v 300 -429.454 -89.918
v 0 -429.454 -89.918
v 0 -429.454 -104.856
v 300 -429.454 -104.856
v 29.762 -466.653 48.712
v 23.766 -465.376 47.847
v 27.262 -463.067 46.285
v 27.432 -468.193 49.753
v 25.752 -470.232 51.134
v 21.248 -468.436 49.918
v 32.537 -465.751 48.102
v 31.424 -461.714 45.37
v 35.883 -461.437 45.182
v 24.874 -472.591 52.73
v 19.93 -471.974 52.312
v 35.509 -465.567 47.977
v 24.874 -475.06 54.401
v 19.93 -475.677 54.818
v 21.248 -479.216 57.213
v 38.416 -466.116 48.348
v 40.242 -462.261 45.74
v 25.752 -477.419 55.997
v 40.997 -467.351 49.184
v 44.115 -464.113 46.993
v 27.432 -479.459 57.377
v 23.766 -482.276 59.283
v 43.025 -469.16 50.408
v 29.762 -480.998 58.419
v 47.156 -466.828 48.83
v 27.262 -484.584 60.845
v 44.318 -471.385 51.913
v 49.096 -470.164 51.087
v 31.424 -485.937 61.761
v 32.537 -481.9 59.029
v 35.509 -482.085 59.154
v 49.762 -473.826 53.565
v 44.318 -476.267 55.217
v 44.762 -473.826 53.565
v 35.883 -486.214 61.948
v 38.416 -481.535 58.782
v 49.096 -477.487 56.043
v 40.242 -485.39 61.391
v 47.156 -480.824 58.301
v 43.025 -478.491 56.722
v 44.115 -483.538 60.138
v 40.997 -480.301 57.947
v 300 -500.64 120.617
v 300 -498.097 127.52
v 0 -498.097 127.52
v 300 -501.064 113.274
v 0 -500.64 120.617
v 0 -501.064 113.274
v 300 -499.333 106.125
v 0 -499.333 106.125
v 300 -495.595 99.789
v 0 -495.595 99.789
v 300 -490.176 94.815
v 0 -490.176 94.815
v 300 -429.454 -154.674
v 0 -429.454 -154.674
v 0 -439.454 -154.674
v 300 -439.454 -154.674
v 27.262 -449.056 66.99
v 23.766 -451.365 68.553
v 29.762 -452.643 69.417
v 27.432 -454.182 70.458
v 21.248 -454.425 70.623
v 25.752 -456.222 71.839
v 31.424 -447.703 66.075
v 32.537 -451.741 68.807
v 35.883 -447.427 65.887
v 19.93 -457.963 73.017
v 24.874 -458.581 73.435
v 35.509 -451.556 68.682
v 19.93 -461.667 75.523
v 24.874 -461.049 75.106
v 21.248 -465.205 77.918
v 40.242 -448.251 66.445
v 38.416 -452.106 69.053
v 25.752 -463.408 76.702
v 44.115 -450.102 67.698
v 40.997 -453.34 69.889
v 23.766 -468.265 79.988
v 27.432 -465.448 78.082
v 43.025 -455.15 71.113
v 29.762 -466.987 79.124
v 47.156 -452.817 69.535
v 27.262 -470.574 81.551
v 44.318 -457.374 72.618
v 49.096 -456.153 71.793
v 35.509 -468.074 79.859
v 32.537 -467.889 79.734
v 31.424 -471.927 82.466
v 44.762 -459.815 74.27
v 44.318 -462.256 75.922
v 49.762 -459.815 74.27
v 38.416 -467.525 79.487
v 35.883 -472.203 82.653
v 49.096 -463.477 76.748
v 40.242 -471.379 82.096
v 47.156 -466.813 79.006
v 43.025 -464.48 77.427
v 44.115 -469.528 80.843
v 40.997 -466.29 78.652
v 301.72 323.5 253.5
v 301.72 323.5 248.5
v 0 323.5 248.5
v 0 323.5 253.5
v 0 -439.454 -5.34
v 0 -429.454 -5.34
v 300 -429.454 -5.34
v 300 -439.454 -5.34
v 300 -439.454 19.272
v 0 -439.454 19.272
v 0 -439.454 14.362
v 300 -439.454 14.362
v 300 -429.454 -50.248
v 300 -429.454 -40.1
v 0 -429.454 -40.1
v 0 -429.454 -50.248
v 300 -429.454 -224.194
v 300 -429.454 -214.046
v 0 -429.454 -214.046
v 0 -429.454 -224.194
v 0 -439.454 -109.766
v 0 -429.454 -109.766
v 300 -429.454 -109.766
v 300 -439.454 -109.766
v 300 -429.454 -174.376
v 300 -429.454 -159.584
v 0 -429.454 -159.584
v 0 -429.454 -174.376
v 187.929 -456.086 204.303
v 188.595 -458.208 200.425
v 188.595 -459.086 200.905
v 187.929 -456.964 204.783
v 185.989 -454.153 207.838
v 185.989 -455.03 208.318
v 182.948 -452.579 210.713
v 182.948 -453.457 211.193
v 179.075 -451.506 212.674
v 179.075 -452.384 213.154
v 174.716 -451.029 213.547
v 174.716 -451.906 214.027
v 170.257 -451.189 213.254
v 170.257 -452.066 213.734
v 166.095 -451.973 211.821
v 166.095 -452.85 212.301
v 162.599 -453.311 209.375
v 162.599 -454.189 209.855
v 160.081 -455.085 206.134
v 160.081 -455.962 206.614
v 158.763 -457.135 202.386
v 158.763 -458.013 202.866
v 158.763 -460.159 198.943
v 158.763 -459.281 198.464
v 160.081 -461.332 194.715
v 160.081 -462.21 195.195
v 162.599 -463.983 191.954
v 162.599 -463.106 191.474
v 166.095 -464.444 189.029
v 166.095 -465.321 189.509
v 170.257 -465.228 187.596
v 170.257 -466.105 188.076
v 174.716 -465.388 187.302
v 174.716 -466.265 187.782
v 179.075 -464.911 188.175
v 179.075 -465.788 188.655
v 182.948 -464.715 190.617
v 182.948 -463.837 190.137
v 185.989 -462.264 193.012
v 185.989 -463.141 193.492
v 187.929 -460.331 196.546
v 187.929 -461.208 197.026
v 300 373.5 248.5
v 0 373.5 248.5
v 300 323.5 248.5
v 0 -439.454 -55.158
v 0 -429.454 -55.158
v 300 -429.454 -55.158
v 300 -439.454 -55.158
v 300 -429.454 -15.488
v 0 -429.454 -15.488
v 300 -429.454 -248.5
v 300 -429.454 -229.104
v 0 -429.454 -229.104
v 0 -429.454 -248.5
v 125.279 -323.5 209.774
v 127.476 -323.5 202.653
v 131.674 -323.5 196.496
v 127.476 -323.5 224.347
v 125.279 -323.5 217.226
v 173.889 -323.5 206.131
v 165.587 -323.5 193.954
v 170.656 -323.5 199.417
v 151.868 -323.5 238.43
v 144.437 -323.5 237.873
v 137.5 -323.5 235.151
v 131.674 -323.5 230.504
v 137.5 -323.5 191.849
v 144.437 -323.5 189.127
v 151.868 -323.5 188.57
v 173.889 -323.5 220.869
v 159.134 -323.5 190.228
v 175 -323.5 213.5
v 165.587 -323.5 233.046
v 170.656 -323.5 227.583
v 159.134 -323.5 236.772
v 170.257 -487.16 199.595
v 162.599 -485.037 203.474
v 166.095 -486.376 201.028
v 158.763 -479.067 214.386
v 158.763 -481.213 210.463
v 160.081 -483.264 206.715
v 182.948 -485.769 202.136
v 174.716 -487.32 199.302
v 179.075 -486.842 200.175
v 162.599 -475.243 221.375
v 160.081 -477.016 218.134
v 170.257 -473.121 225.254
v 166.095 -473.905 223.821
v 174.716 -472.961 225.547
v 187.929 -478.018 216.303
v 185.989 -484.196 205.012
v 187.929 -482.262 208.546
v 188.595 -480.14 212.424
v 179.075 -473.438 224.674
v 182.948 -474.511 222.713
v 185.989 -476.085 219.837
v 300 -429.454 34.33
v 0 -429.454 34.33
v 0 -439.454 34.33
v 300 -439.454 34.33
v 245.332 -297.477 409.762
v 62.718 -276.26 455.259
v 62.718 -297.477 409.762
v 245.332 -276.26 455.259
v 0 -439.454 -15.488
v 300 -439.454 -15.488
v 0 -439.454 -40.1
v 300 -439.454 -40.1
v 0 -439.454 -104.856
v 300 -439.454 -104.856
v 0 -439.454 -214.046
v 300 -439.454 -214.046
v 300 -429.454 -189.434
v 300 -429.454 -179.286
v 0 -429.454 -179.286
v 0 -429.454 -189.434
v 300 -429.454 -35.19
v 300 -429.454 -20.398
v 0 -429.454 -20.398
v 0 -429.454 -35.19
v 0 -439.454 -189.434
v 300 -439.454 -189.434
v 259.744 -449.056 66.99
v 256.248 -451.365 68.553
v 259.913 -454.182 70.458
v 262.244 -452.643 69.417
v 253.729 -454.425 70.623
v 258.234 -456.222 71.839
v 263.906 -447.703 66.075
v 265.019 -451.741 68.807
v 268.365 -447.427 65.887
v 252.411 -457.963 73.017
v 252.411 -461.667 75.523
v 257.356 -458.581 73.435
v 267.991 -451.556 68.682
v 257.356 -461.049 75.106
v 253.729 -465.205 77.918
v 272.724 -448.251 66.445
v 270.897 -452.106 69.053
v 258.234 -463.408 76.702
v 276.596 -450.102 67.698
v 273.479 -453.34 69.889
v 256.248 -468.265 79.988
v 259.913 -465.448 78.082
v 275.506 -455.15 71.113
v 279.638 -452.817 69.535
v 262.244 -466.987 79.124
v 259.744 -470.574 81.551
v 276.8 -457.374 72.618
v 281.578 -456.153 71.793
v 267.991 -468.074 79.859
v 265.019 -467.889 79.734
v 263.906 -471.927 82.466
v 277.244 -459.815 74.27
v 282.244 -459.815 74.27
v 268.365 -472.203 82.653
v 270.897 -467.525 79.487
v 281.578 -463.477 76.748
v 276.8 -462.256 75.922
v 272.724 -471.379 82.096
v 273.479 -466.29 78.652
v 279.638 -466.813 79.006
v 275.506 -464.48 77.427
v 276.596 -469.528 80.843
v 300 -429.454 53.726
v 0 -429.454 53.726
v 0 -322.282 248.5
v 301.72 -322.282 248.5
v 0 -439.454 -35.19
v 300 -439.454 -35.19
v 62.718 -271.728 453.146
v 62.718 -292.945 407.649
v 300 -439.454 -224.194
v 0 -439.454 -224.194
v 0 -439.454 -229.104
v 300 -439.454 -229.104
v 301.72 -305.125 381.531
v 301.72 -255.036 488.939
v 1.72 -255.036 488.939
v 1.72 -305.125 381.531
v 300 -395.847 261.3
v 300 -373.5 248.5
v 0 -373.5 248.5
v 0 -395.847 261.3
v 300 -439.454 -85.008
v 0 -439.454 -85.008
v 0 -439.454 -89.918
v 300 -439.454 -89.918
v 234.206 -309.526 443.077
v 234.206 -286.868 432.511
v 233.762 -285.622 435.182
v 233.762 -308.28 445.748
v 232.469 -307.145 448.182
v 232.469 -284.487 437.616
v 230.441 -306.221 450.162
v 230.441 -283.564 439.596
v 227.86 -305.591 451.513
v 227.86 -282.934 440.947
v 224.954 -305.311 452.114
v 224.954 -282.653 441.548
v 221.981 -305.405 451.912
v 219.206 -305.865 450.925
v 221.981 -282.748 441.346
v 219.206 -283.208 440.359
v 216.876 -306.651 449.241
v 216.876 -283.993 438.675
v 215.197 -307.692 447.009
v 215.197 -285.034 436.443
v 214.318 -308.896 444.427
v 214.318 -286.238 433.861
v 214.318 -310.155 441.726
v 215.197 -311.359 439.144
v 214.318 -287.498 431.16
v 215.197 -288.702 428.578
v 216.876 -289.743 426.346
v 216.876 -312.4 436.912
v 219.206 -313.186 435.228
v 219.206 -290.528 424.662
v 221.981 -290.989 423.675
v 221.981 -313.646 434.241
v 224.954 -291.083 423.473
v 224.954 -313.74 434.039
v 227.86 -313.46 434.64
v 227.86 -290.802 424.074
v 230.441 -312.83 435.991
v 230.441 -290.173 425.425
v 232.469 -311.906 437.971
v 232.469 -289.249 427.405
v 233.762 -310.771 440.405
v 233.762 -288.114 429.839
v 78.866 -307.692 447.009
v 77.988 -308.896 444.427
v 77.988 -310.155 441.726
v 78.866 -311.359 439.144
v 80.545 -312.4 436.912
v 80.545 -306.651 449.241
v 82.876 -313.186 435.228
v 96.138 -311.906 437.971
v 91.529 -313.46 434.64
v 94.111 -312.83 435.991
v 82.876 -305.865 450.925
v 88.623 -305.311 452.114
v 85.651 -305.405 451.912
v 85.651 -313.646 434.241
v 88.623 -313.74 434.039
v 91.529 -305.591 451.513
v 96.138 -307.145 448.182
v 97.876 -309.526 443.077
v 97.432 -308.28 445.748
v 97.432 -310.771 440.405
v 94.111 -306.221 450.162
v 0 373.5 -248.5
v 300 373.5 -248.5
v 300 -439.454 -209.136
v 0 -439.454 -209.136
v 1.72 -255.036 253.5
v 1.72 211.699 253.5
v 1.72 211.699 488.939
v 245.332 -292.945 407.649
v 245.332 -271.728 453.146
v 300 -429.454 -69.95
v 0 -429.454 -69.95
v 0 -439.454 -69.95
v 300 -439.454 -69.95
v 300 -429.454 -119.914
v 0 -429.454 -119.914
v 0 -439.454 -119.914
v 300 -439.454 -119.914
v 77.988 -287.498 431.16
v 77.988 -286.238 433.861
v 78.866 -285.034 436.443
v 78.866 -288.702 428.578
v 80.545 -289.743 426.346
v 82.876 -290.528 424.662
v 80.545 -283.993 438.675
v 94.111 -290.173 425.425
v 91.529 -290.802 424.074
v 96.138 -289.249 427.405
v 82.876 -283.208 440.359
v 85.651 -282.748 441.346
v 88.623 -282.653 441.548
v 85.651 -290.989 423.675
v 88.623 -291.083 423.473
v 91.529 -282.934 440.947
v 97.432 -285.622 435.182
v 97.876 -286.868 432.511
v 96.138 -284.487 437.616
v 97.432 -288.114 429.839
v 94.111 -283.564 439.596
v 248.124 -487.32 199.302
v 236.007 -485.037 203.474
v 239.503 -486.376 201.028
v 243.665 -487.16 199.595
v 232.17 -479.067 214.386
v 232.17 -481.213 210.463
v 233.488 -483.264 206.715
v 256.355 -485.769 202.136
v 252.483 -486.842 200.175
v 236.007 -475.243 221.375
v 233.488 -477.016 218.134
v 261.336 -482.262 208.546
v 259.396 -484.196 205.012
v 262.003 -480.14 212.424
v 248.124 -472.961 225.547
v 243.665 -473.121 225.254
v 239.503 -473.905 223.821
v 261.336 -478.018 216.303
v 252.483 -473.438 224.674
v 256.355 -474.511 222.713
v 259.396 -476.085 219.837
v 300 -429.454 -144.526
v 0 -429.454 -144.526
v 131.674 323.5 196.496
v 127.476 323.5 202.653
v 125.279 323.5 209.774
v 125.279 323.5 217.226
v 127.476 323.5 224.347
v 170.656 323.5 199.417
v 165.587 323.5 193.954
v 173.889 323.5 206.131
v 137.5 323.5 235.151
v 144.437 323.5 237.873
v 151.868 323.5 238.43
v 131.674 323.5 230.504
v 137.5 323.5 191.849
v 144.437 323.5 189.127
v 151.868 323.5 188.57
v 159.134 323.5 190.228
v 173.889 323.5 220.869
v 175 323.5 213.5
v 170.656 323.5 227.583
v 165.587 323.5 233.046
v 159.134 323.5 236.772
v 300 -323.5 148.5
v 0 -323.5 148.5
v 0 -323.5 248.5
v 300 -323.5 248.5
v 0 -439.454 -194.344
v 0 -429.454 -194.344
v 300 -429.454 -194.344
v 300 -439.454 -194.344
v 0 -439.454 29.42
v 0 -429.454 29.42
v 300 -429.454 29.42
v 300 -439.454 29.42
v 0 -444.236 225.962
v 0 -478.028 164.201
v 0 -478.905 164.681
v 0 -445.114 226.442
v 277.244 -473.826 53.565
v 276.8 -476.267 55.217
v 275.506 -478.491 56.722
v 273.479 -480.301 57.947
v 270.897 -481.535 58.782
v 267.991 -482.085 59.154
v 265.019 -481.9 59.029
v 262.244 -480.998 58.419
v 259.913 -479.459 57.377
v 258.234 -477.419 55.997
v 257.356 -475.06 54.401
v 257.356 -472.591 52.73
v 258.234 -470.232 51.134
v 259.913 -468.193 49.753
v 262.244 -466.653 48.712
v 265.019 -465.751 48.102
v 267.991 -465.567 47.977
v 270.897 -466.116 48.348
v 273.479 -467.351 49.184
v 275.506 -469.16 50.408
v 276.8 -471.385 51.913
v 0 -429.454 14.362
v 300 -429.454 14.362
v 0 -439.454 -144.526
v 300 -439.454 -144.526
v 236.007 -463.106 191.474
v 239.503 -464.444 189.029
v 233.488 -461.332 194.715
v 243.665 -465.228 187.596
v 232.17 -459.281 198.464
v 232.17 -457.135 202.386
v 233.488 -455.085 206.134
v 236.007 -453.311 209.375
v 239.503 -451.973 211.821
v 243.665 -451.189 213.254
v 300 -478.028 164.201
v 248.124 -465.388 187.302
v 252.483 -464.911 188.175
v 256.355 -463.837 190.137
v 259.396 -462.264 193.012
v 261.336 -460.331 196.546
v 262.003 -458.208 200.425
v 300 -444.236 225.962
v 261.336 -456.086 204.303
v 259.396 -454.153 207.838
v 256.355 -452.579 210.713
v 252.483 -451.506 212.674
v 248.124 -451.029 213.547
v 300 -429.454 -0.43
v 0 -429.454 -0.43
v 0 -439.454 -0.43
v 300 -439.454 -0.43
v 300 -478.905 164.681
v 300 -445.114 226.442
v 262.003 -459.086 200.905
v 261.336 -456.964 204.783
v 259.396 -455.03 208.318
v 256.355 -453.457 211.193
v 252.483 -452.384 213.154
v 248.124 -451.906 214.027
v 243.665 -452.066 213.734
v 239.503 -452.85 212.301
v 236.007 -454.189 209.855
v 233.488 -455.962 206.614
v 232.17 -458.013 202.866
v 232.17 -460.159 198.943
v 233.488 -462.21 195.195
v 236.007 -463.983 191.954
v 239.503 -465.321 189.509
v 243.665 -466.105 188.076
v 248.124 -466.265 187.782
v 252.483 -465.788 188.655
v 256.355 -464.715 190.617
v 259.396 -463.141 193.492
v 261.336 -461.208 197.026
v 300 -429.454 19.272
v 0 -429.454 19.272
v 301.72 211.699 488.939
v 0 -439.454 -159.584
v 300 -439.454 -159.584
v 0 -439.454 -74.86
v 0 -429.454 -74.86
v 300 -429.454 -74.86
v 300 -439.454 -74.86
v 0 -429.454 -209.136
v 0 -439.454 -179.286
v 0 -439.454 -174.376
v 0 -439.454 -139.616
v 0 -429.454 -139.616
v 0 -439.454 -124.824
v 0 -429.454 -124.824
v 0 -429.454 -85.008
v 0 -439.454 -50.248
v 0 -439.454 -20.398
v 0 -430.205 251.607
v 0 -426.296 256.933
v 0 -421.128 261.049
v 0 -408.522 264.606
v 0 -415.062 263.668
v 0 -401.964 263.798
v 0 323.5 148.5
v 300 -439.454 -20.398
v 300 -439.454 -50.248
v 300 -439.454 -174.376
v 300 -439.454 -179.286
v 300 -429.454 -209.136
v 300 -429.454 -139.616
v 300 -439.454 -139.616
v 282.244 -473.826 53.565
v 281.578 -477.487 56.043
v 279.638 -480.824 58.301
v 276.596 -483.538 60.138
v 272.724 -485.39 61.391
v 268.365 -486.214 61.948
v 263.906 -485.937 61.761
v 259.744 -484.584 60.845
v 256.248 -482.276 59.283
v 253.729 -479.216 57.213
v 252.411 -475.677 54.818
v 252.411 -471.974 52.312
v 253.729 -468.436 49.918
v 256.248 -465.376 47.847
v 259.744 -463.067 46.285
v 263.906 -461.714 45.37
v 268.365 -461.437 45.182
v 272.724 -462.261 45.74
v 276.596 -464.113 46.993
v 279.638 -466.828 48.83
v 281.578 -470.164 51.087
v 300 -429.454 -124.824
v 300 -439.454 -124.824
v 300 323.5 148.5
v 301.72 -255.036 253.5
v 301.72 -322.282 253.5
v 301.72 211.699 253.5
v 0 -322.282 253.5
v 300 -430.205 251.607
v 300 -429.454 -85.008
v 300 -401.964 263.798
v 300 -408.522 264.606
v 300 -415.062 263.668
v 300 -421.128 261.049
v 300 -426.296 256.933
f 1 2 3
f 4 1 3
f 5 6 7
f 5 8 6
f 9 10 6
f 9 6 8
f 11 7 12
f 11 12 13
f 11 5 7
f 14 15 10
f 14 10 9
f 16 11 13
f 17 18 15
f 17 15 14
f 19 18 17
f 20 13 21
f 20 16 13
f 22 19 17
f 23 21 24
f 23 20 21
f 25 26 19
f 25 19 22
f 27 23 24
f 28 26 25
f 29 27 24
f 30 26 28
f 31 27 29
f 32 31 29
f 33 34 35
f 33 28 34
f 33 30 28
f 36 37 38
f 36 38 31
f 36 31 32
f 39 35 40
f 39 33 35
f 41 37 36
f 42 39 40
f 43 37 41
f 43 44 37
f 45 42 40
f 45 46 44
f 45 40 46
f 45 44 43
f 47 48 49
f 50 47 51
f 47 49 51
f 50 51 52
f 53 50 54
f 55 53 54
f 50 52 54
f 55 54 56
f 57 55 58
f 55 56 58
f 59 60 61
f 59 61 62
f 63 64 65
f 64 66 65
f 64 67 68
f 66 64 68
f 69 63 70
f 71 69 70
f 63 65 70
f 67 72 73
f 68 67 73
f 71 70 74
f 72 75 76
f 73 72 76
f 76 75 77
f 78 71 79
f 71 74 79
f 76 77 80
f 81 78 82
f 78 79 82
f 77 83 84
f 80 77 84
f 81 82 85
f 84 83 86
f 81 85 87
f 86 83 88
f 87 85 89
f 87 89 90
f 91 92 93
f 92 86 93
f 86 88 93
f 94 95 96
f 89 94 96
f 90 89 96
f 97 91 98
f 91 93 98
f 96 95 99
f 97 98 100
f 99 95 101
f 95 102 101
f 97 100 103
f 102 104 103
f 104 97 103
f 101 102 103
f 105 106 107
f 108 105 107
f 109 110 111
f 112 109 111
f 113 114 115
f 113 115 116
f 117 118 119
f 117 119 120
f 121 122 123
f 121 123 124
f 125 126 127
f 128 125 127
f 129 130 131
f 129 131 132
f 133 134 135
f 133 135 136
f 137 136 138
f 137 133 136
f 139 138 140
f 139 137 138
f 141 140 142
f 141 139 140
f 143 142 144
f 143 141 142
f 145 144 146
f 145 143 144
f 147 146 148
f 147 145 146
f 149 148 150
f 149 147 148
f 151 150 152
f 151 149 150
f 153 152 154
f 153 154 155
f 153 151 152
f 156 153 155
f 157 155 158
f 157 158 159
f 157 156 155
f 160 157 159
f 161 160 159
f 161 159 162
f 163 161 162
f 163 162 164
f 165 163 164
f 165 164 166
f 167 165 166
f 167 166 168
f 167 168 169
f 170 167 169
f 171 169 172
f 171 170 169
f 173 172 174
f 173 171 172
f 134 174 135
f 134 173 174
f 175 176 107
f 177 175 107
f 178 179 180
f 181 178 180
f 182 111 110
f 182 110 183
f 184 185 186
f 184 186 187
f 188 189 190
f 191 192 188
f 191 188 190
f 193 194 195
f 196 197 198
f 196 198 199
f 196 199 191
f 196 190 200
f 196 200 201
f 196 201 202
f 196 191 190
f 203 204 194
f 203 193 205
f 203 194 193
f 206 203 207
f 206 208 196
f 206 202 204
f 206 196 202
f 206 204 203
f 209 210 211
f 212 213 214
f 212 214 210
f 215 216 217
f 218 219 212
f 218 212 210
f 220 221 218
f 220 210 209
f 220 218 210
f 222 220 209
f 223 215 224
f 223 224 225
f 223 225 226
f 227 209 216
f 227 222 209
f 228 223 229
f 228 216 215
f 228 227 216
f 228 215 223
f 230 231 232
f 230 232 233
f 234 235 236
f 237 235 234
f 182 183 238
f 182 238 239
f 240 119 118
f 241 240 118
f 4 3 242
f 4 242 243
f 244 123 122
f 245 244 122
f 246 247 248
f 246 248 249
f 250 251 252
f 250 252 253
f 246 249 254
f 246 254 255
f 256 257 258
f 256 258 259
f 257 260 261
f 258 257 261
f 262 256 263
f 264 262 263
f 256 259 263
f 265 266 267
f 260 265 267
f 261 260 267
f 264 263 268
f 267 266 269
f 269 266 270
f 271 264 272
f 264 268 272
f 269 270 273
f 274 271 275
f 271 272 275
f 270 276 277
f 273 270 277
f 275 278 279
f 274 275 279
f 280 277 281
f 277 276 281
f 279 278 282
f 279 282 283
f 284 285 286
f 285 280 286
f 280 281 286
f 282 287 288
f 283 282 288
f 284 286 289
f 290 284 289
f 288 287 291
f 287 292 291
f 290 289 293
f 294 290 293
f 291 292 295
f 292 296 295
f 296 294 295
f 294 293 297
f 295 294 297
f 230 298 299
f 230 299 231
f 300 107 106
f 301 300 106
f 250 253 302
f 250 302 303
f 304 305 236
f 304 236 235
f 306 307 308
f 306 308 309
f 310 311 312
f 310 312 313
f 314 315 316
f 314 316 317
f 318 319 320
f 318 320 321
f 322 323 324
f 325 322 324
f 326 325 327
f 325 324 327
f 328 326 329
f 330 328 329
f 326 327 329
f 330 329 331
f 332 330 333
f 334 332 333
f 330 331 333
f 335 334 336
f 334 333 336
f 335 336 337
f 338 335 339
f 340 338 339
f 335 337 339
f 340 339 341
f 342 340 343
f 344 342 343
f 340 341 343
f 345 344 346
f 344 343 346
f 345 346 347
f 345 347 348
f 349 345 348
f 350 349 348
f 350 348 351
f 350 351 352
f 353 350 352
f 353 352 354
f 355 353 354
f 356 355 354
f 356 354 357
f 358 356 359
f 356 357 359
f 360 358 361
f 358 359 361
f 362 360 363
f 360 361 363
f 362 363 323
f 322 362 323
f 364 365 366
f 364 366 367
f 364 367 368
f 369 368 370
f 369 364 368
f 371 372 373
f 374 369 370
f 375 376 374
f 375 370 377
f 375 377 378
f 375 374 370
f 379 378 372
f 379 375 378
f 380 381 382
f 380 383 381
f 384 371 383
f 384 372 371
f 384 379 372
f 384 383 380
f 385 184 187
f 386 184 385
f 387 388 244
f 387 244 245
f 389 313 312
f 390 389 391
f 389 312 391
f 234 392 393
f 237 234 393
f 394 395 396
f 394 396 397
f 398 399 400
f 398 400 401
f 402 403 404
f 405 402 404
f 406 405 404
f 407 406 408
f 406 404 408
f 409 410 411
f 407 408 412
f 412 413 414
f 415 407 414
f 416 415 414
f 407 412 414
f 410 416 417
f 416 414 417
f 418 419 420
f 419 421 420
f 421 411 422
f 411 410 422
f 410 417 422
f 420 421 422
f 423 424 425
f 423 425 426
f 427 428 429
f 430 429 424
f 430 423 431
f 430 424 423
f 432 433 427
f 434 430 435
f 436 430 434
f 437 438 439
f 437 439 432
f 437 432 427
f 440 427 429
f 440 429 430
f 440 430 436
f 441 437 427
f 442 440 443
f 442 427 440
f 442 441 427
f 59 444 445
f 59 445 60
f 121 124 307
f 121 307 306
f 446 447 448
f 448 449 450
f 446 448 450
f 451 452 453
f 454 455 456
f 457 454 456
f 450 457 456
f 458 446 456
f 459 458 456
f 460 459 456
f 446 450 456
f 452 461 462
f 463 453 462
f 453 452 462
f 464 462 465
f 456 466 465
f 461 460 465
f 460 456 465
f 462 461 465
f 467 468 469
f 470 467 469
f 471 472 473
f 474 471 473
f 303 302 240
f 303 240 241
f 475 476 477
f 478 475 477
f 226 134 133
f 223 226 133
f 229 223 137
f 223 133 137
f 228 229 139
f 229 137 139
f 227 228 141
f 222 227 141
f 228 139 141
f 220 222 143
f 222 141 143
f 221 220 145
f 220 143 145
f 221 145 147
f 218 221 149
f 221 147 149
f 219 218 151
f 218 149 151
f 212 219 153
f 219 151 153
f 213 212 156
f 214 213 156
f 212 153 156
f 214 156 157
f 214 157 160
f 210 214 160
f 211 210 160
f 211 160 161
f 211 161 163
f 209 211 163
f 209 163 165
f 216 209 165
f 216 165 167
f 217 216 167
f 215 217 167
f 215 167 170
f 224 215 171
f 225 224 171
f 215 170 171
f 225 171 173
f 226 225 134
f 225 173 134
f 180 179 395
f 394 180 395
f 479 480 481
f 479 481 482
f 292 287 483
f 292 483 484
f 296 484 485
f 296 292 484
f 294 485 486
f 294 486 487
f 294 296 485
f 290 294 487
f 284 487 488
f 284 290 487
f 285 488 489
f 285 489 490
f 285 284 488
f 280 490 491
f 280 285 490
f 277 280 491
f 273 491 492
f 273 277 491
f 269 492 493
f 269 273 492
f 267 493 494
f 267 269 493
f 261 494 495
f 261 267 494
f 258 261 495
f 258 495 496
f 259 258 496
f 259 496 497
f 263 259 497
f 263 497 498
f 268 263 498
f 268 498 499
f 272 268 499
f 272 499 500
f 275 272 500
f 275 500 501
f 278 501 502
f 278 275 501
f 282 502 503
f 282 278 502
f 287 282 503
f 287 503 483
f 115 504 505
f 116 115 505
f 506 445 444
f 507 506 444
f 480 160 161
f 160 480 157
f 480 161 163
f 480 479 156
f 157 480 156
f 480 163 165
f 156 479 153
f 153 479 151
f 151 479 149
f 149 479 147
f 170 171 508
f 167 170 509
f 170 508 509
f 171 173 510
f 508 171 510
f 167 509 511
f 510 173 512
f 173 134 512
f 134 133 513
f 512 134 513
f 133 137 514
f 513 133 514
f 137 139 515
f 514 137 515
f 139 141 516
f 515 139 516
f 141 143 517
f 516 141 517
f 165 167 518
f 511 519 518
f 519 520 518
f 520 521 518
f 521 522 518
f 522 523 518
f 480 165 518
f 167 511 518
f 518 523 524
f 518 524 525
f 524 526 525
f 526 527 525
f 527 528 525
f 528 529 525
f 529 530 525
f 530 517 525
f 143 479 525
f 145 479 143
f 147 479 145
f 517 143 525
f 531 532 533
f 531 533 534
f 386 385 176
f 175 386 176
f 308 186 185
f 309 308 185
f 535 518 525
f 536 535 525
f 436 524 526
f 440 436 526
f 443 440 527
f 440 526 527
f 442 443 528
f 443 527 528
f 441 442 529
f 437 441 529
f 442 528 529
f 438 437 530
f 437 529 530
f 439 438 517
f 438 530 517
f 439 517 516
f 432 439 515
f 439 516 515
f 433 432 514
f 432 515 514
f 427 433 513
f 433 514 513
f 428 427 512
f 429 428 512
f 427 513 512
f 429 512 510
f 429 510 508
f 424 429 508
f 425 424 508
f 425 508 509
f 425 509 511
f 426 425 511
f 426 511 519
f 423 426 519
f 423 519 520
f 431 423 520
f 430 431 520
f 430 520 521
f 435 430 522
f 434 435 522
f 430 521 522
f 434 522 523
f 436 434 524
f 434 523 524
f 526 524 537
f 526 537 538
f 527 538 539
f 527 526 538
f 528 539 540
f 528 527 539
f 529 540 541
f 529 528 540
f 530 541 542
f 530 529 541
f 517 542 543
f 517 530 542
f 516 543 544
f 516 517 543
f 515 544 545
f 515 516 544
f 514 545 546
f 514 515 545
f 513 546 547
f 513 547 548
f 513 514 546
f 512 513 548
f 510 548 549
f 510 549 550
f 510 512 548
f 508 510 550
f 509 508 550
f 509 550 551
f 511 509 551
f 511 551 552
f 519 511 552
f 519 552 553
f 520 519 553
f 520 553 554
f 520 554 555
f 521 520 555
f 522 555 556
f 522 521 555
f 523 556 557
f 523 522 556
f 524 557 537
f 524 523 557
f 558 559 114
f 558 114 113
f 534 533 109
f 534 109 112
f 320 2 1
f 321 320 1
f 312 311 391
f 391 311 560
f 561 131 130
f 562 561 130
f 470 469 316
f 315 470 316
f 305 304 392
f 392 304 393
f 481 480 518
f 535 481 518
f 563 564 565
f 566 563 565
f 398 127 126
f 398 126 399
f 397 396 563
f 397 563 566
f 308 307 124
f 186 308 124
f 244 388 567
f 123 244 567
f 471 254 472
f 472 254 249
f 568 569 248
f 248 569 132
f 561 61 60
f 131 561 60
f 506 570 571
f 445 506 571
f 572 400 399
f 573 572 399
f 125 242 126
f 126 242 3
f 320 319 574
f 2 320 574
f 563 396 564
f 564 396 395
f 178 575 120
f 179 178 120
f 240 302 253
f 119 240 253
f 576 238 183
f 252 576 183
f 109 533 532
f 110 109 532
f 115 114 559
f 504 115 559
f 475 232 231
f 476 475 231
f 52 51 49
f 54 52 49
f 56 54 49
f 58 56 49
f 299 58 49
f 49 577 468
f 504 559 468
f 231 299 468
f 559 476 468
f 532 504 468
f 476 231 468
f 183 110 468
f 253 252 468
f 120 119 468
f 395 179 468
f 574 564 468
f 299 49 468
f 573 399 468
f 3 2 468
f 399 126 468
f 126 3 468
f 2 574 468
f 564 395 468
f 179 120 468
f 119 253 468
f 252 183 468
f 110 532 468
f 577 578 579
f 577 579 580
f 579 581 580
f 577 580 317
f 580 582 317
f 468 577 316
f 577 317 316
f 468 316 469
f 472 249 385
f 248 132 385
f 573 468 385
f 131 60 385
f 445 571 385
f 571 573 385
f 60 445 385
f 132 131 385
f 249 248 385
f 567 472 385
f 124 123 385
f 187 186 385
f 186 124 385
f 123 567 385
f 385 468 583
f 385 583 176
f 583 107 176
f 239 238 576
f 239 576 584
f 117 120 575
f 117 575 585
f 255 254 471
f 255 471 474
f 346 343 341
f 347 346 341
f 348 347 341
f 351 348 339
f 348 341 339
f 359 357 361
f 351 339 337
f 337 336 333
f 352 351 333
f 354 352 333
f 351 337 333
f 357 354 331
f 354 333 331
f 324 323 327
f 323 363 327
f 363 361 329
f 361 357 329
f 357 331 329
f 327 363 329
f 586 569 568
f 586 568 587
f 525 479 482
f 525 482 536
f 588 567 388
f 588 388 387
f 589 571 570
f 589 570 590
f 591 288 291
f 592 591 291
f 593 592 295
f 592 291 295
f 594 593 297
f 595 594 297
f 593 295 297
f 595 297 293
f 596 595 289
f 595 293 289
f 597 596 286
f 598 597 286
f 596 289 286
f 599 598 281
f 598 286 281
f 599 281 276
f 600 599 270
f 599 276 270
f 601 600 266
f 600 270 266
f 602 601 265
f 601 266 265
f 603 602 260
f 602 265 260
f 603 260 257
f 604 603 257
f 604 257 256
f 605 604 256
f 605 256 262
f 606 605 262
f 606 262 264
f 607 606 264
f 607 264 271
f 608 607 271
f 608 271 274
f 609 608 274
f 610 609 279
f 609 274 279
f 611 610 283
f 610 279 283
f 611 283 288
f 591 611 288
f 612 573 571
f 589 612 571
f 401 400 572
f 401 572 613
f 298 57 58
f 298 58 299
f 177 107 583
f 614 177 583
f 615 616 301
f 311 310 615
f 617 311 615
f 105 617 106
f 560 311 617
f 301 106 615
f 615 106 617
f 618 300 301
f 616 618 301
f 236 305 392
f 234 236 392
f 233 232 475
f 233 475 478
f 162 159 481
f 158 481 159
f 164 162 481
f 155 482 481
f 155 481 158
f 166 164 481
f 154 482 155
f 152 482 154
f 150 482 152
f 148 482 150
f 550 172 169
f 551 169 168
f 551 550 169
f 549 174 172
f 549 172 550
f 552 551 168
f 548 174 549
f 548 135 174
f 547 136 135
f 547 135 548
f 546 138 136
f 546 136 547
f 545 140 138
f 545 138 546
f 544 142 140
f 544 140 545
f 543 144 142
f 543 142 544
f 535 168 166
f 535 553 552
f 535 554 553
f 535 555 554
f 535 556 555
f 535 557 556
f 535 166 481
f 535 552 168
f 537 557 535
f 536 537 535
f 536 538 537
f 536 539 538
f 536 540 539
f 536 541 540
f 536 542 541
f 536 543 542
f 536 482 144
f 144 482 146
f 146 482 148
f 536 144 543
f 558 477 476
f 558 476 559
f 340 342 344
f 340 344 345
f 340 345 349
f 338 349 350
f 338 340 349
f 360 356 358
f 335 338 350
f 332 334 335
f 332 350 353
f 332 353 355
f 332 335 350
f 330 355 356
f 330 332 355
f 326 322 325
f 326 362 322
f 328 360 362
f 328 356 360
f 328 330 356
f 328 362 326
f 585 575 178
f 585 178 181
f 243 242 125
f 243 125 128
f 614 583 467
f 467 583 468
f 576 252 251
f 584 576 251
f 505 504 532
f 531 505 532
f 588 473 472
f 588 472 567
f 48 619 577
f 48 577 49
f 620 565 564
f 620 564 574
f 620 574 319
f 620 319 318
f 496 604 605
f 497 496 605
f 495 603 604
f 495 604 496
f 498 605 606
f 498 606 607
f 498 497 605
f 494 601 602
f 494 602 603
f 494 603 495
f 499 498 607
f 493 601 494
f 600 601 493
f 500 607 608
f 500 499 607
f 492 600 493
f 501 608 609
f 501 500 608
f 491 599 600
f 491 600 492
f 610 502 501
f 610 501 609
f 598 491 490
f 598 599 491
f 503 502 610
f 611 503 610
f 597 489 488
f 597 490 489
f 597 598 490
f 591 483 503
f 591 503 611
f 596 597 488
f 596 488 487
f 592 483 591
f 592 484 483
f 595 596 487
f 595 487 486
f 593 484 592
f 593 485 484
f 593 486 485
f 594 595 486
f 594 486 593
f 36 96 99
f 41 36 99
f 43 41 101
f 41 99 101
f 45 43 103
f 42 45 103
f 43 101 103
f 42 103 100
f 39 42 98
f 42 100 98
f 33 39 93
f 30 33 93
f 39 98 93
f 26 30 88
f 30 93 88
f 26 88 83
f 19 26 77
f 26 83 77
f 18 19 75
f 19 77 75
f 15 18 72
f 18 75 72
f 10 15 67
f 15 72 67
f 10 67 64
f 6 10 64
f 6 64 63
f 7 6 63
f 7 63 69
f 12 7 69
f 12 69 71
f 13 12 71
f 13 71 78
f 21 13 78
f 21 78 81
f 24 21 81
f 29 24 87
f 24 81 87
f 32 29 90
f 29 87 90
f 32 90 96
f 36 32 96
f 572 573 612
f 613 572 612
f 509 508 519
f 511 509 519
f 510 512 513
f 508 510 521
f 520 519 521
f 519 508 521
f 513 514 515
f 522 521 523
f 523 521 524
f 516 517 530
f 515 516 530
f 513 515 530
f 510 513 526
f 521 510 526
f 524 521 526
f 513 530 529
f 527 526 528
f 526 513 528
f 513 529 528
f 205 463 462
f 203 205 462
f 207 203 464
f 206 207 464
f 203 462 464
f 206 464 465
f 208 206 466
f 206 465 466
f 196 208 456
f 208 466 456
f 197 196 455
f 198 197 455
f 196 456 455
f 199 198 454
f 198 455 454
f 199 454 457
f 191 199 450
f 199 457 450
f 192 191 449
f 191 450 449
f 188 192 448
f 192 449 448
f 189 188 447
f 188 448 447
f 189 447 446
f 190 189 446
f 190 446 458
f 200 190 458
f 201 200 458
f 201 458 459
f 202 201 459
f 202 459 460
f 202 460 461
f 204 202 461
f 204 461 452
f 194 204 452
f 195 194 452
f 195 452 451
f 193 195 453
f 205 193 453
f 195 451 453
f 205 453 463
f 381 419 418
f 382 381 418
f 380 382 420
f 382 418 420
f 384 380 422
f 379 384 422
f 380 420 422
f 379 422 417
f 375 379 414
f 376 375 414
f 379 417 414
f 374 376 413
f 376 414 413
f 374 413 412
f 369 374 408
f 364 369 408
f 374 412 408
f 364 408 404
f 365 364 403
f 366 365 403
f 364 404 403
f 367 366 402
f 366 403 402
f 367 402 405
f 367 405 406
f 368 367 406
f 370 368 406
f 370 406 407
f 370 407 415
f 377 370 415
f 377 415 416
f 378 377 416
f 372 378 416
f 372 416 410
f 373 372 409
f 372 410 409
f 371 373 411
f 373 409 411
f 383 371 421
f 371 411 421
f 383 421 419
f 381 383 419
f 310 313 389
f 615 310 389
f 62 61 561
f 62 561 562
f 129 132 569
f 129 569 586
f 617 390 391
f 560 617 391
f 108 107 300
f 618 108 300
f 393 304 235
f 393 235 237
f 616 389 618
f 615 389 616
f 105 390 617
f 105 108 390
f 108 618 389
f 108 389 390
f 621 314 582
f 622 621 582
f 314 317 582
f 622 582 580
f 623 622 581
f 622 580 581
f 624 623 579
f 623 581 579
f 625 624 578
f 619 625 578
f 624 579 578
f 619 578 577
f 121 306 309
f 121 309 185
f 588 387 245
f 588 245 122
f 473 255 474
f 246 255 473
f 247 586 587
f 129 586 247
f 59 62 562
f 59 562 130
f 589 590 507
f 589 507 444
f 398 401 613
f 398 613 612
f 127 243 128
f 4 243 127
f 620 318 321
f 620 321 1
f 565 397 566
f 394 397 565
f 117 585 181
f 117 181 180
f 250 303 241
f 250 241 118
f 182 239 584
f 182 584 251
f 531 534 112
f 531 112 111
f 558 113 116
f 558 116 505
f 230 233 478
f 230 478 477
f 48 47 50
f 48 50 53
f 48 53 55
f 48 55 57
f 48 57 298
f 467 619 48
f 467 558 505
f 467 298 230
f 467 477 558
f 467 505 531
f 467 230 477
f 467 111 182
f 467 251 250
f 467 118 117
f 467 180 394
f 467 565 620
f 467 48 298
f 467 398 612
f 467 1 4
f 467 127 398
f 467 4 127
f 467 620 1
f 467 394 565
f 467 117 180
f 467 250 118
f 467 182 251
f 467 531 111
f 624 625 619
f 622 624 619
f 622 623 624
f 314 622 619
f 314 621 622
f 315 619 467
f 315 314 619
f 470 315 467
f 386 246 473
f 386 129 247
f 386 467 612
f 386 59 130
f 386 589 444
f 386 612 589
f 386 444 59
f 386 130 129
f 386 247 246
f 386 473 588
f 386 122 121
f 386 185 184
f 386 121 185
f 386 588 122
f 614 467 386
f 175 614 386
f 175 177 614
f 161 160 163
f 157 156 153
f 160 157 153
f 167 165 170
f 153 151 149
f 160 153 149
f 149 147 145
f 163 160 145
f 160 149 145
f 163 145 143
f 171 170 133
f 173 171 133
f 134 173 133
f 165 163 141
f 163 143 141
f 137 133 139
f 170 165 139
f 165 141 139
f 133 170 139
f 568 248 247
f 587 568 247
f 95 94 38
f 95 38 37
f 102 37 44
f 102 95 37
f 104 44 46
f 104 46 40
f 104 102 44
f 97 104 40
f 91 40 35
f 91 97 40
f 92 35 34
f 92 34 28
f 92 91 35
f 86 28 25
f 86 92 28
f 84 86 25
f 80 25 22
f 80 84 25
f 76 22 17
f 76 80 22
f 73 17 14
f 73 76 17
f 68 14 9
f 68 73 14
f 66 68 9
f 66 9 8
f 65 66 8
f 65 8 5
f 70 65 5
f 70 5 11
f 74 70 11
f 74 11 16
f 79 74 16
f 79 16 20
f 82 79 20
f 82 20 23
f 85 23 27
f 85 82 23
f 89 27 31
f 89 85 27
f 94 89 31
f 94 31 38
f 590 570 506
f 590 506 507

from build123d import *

# Parameters (mm, degrees)
F1_DEPTH  = 300
F2_R      = 25
F3_DEPTH  = 647
F5_DEPTH  = 300
F6_R      = 25
F7_R      = 25
F8_W      = 300
F8_H      = 70.4002976418
F8_R      = 15
F9_DEPTH  = 1
F10_DEPTH = 25
F11_DEPTH = 25
F12_R     = 15
F12_R_2   = 10
F13_DEPTH = 25
F14_W     = 300
F14_H     = 4.9098450691
F15_DEPTH = 10
F17_DEPTH = 5
F18_W     = 466.7353928089
F18_H     = 235.4385998249
F19_DEPTH = 300
F21_DEPTH = 300
F22_W     = 182.6146915555
F22_H     = 50.2008646727
F23_DEPTH = 5
F24_R     = 10
F25_DEPTH = 25


with BuildPart() as f1:
    # F0 (on Right) → F1 (new body)
    with BuildSketch(Plane.YZ):
        Polygon((-373.5, 248.5), (-373.5, -248.5), (373.5, -248.5), (373.5, 248.5), (323.5, 248.5), (323.5, 148.5), (-323.5, 148.5), (-323.5, 248.5), align=None)
    extrude(amount=F1_DEPTH)

    # F4 (on face) → F5 (join)
    with BuildSketch(Plane.YZ.offset(300)):
        Polygon((-373.5, -248.5), (-373.5, 248.5), (-417.9687320084, 273.9712044001), (-509.0158401817, 107.5635223985), (-429.4541000218, 53.7257350385), (-429.4541000218, -248.5), align=None)
    extrude(amount=-F5_DEPTH)

    # F6
    f6_edges = [f1.edges().sort_by_distance(p)[0] for p in [
        (150, -417.968732, 273.971204),
    ]]
    fillet(f6_edges, radius=F6_R)

    # F7
    f7_edges = [f1.edges().sort_by_distance(p)[0] for p in [
        (150, -509.01584, 107.563522),
    ]]
    fillet(f7_edges, radius=F7_R)

    # F14 (on face) → F15 (join)
    with BuildSketch(Plane.XZ.offset(429.4541000218)):
        with Locations((150, 31.8747041747)):
            Rectangle(F14_W, F14_H)
        with Locations((150, 16.8167771772)):
            Rectangle(F14_W, F14_H)
        with Locations((150, -2.8852845505)):
            Rectangle(F14_W, F14_H)
        with Locations((150, -17.943211548)):
            Rectangle(F14_W, F14_H)
        with Locations((150, -37.6452732757)):
            Rectangle(F14_W, F14_H)
        with Locations((150, -52.7032002732)):
            Rectangle(F14_W, F14_H)
        with Locations((150, -72.4052620009)):
            Rectangle(F14_W, F14_H)
        with Locations((150, -87.4631889984)):
            Rectangle(F14_W, F14_H)
        with Locations((150, -107.3110759631)):
            Rectangle(F14_W, F14_H)
        with Locations((150, -122.3690029606)):
            Rectangle(F14_W, F14_H)
        with Locations((150, -142.0710646883)):
            Rectangle(F14_W, F14_H)
        with Locations((150, -157.1289916858)):
            Rectangle(F14_W, F14_H)
        with Locations((150, -176.8310534135)):
            Rectangle(F14_W, F14_H)
        with Locations((150, -191.888980411)):
            Rectangle(F14_W, F14_H)
        with Locations((150, -211.5910421386)):
            Rectangle(F14_W, F14_H)
        with Locations((150, -226.6489691362)):
            Rectangle(F14_W, F14_H)
    extrude(amount=F15_DEPTH)


with BuildPart() as f3:
    # F2 (on face) → F3 (new body, through all)
    with BuildSketch(Plane.XZ.offset(-323.5)):
        with Locations((150, 213.5)):
            Circle(F2_R)
    extrude(amount=F3_DEPTH)


with BuildPart() as f9:
    # F8 (on face) → F9 (new body)
    with BuildSketch(Plane(origin=(0, -437.0381157891, 239.1179068509), x_dir=(1, 0, 0), z_dir=(0, -0.8772758982, 0.4799864564))):
        with Locations((150, -50.1969009638)):
            Rectangle(F8_W, F8_H)
        with Locations((173.5952753637, -44.1060066223)):
            Circle(F8_R, mode=Mode.SUBTRACT)
        with Locations((247.0025908139, -44.1060066223)):
            Circle(F8_R, mode=Mode.SUBTRACT)
    extrude(amount=F9_DEPTH)


with BuildPart() as f10:
    # F8 (on face) → F10 (new body)
    with BuildSketch(Plane(origin=(0, -437.0381157891, 239.1179068509), x_dir=(1, 0, 0), z_dir=(0, -0.8772758982, 0.4799864564))):
        with Locations((173.5952753637, -44.1060066223)):
            Circle(F8_R)
    extrude(amount=F10_DEPTH)


with BuildPart() as f11:
    # F8 (on face) → F11 (new body)
    with BuildSketch(Plane(origin=(0, -437.0381157891, 239.1179068509), x_dir=(1, 0, 0), z_dir=(0, -0.8772758982, 0.4799864564))):
        with Locations((247.0025908139, -44.1060066223)):
            Circle(F8_R)
    extrude(amount=F11_DEPTH)


with BuildPart() as f13:
    # F12 (on face) → F13 (new body)
    with BuildSketch(Plane(origin=(0, -109.9460351412, -162.4787776109), x_dir=(1, 0, 0), z_dir=(0, -0.560427984, -0.8282031603))):
        with Locations((34.7621776164, 422.4434431663)):
            Circle(F12_R)
        with Locations((34.7621776164, 422.4434431663)):
            Circle(F12_R_2, mode=Mode.SUBTRACT)
    extrude(amount=F13_DEPTH)


with BuildPart() as f13b:
    # F12 (on face) → F13, piece 2 (new body)
    with BuildSketch(Plane(origin=(0, -109.9460351412, -162.4787776109), x_dir=(1, 0, 0), z_dir=(0, -0.560427984, -0.8282031603))):
        with Locations((267.2439217567, 422.4434431663)):
            Circle(F12_R)
        with Locations((267.2439217567, 422.4434431663)):
            Circle(F12_R_2, mode=Mode.SUBTRACT)
    extrude(amount=F13_DEPTH)


with BuildPart() as f17:
    # F16 (on face) → F17 (new body)
    with BuildSketch(Plane.XY.offset(248.5)):
        Polygon((300, 323.5), (0, 323.5), (0, -322.2822844982), (301.719814539, -322.2822844982), (301.719814539, 323.5), align=None)
    extrude(amount=F17_DEPTH)

    # F18 (on face) → F19 (join)
    with BuildSketch(Plane.YZ.offset(301.719814539)):
        with Locations((-21.6684192419, 371.2192999125)):
            Rectangle(F18_W, F18_H)
    extrude(amount=-F19_DEPTH)

    # F20 (on face) → F21 (join)
    with BuildSketch(Plane.YZ.offset(301.719814539)):
        Polygon((-305.1252663136, 381.5310895443), (-255.0361156464, 253.5), (-255.0361156464, 488.9385998249), align=None)
    extrude(amount=-F21_DEPTH)


with BuildPart() as f23:
    # F22 (on face) → F23 (new body)
    with BuildSketch(Plane(origin=(0, -396.763258485, 185.0292831622), x_dir=(1, 0, 0), z_dir=(0, -0.9062941929, 0.4226474132))):
        with Locations((154.0248654783, 270.7376852632)):
            Rectangle(F22_W, F22_H)
    extrude(amount=F23_DEPTH)


with BuildPart() as f25:
    # F24 (on face) → F25 (new body)
    with BuildSketch(Plane(origin=(0, -401.2947294496, 187.1425202282), x_dir=(1, 0, 0), z_dir=(0, -0.9062941929, 0.4226474132))):
        with Locations((87.8758430481, 270.7376852632)):
            Circle(F24_R)
    extrude(amount=F25_DEPTH)


with BuildPart() as f25b:
    # F24 (on face) → F25, piece 2 (new body)
    with BuildSketch(Plane(origin=(0, -401.2947294496, 187.1425202282), x_dir=(1, 0, 0), z_dir=(0, -0.9062941929, 0.4226474132))):
        with Locations((224.2062836885, 270.7376852632)):
            Circle(F24_R)
    extrude(amount=F25_DEPTH)


solid = Compound([f1.part, f3.part, f9.part, f10.part, f11.part, f13.part, f13b.part, f17.part, f23.part, f25.part, f25b.part])
